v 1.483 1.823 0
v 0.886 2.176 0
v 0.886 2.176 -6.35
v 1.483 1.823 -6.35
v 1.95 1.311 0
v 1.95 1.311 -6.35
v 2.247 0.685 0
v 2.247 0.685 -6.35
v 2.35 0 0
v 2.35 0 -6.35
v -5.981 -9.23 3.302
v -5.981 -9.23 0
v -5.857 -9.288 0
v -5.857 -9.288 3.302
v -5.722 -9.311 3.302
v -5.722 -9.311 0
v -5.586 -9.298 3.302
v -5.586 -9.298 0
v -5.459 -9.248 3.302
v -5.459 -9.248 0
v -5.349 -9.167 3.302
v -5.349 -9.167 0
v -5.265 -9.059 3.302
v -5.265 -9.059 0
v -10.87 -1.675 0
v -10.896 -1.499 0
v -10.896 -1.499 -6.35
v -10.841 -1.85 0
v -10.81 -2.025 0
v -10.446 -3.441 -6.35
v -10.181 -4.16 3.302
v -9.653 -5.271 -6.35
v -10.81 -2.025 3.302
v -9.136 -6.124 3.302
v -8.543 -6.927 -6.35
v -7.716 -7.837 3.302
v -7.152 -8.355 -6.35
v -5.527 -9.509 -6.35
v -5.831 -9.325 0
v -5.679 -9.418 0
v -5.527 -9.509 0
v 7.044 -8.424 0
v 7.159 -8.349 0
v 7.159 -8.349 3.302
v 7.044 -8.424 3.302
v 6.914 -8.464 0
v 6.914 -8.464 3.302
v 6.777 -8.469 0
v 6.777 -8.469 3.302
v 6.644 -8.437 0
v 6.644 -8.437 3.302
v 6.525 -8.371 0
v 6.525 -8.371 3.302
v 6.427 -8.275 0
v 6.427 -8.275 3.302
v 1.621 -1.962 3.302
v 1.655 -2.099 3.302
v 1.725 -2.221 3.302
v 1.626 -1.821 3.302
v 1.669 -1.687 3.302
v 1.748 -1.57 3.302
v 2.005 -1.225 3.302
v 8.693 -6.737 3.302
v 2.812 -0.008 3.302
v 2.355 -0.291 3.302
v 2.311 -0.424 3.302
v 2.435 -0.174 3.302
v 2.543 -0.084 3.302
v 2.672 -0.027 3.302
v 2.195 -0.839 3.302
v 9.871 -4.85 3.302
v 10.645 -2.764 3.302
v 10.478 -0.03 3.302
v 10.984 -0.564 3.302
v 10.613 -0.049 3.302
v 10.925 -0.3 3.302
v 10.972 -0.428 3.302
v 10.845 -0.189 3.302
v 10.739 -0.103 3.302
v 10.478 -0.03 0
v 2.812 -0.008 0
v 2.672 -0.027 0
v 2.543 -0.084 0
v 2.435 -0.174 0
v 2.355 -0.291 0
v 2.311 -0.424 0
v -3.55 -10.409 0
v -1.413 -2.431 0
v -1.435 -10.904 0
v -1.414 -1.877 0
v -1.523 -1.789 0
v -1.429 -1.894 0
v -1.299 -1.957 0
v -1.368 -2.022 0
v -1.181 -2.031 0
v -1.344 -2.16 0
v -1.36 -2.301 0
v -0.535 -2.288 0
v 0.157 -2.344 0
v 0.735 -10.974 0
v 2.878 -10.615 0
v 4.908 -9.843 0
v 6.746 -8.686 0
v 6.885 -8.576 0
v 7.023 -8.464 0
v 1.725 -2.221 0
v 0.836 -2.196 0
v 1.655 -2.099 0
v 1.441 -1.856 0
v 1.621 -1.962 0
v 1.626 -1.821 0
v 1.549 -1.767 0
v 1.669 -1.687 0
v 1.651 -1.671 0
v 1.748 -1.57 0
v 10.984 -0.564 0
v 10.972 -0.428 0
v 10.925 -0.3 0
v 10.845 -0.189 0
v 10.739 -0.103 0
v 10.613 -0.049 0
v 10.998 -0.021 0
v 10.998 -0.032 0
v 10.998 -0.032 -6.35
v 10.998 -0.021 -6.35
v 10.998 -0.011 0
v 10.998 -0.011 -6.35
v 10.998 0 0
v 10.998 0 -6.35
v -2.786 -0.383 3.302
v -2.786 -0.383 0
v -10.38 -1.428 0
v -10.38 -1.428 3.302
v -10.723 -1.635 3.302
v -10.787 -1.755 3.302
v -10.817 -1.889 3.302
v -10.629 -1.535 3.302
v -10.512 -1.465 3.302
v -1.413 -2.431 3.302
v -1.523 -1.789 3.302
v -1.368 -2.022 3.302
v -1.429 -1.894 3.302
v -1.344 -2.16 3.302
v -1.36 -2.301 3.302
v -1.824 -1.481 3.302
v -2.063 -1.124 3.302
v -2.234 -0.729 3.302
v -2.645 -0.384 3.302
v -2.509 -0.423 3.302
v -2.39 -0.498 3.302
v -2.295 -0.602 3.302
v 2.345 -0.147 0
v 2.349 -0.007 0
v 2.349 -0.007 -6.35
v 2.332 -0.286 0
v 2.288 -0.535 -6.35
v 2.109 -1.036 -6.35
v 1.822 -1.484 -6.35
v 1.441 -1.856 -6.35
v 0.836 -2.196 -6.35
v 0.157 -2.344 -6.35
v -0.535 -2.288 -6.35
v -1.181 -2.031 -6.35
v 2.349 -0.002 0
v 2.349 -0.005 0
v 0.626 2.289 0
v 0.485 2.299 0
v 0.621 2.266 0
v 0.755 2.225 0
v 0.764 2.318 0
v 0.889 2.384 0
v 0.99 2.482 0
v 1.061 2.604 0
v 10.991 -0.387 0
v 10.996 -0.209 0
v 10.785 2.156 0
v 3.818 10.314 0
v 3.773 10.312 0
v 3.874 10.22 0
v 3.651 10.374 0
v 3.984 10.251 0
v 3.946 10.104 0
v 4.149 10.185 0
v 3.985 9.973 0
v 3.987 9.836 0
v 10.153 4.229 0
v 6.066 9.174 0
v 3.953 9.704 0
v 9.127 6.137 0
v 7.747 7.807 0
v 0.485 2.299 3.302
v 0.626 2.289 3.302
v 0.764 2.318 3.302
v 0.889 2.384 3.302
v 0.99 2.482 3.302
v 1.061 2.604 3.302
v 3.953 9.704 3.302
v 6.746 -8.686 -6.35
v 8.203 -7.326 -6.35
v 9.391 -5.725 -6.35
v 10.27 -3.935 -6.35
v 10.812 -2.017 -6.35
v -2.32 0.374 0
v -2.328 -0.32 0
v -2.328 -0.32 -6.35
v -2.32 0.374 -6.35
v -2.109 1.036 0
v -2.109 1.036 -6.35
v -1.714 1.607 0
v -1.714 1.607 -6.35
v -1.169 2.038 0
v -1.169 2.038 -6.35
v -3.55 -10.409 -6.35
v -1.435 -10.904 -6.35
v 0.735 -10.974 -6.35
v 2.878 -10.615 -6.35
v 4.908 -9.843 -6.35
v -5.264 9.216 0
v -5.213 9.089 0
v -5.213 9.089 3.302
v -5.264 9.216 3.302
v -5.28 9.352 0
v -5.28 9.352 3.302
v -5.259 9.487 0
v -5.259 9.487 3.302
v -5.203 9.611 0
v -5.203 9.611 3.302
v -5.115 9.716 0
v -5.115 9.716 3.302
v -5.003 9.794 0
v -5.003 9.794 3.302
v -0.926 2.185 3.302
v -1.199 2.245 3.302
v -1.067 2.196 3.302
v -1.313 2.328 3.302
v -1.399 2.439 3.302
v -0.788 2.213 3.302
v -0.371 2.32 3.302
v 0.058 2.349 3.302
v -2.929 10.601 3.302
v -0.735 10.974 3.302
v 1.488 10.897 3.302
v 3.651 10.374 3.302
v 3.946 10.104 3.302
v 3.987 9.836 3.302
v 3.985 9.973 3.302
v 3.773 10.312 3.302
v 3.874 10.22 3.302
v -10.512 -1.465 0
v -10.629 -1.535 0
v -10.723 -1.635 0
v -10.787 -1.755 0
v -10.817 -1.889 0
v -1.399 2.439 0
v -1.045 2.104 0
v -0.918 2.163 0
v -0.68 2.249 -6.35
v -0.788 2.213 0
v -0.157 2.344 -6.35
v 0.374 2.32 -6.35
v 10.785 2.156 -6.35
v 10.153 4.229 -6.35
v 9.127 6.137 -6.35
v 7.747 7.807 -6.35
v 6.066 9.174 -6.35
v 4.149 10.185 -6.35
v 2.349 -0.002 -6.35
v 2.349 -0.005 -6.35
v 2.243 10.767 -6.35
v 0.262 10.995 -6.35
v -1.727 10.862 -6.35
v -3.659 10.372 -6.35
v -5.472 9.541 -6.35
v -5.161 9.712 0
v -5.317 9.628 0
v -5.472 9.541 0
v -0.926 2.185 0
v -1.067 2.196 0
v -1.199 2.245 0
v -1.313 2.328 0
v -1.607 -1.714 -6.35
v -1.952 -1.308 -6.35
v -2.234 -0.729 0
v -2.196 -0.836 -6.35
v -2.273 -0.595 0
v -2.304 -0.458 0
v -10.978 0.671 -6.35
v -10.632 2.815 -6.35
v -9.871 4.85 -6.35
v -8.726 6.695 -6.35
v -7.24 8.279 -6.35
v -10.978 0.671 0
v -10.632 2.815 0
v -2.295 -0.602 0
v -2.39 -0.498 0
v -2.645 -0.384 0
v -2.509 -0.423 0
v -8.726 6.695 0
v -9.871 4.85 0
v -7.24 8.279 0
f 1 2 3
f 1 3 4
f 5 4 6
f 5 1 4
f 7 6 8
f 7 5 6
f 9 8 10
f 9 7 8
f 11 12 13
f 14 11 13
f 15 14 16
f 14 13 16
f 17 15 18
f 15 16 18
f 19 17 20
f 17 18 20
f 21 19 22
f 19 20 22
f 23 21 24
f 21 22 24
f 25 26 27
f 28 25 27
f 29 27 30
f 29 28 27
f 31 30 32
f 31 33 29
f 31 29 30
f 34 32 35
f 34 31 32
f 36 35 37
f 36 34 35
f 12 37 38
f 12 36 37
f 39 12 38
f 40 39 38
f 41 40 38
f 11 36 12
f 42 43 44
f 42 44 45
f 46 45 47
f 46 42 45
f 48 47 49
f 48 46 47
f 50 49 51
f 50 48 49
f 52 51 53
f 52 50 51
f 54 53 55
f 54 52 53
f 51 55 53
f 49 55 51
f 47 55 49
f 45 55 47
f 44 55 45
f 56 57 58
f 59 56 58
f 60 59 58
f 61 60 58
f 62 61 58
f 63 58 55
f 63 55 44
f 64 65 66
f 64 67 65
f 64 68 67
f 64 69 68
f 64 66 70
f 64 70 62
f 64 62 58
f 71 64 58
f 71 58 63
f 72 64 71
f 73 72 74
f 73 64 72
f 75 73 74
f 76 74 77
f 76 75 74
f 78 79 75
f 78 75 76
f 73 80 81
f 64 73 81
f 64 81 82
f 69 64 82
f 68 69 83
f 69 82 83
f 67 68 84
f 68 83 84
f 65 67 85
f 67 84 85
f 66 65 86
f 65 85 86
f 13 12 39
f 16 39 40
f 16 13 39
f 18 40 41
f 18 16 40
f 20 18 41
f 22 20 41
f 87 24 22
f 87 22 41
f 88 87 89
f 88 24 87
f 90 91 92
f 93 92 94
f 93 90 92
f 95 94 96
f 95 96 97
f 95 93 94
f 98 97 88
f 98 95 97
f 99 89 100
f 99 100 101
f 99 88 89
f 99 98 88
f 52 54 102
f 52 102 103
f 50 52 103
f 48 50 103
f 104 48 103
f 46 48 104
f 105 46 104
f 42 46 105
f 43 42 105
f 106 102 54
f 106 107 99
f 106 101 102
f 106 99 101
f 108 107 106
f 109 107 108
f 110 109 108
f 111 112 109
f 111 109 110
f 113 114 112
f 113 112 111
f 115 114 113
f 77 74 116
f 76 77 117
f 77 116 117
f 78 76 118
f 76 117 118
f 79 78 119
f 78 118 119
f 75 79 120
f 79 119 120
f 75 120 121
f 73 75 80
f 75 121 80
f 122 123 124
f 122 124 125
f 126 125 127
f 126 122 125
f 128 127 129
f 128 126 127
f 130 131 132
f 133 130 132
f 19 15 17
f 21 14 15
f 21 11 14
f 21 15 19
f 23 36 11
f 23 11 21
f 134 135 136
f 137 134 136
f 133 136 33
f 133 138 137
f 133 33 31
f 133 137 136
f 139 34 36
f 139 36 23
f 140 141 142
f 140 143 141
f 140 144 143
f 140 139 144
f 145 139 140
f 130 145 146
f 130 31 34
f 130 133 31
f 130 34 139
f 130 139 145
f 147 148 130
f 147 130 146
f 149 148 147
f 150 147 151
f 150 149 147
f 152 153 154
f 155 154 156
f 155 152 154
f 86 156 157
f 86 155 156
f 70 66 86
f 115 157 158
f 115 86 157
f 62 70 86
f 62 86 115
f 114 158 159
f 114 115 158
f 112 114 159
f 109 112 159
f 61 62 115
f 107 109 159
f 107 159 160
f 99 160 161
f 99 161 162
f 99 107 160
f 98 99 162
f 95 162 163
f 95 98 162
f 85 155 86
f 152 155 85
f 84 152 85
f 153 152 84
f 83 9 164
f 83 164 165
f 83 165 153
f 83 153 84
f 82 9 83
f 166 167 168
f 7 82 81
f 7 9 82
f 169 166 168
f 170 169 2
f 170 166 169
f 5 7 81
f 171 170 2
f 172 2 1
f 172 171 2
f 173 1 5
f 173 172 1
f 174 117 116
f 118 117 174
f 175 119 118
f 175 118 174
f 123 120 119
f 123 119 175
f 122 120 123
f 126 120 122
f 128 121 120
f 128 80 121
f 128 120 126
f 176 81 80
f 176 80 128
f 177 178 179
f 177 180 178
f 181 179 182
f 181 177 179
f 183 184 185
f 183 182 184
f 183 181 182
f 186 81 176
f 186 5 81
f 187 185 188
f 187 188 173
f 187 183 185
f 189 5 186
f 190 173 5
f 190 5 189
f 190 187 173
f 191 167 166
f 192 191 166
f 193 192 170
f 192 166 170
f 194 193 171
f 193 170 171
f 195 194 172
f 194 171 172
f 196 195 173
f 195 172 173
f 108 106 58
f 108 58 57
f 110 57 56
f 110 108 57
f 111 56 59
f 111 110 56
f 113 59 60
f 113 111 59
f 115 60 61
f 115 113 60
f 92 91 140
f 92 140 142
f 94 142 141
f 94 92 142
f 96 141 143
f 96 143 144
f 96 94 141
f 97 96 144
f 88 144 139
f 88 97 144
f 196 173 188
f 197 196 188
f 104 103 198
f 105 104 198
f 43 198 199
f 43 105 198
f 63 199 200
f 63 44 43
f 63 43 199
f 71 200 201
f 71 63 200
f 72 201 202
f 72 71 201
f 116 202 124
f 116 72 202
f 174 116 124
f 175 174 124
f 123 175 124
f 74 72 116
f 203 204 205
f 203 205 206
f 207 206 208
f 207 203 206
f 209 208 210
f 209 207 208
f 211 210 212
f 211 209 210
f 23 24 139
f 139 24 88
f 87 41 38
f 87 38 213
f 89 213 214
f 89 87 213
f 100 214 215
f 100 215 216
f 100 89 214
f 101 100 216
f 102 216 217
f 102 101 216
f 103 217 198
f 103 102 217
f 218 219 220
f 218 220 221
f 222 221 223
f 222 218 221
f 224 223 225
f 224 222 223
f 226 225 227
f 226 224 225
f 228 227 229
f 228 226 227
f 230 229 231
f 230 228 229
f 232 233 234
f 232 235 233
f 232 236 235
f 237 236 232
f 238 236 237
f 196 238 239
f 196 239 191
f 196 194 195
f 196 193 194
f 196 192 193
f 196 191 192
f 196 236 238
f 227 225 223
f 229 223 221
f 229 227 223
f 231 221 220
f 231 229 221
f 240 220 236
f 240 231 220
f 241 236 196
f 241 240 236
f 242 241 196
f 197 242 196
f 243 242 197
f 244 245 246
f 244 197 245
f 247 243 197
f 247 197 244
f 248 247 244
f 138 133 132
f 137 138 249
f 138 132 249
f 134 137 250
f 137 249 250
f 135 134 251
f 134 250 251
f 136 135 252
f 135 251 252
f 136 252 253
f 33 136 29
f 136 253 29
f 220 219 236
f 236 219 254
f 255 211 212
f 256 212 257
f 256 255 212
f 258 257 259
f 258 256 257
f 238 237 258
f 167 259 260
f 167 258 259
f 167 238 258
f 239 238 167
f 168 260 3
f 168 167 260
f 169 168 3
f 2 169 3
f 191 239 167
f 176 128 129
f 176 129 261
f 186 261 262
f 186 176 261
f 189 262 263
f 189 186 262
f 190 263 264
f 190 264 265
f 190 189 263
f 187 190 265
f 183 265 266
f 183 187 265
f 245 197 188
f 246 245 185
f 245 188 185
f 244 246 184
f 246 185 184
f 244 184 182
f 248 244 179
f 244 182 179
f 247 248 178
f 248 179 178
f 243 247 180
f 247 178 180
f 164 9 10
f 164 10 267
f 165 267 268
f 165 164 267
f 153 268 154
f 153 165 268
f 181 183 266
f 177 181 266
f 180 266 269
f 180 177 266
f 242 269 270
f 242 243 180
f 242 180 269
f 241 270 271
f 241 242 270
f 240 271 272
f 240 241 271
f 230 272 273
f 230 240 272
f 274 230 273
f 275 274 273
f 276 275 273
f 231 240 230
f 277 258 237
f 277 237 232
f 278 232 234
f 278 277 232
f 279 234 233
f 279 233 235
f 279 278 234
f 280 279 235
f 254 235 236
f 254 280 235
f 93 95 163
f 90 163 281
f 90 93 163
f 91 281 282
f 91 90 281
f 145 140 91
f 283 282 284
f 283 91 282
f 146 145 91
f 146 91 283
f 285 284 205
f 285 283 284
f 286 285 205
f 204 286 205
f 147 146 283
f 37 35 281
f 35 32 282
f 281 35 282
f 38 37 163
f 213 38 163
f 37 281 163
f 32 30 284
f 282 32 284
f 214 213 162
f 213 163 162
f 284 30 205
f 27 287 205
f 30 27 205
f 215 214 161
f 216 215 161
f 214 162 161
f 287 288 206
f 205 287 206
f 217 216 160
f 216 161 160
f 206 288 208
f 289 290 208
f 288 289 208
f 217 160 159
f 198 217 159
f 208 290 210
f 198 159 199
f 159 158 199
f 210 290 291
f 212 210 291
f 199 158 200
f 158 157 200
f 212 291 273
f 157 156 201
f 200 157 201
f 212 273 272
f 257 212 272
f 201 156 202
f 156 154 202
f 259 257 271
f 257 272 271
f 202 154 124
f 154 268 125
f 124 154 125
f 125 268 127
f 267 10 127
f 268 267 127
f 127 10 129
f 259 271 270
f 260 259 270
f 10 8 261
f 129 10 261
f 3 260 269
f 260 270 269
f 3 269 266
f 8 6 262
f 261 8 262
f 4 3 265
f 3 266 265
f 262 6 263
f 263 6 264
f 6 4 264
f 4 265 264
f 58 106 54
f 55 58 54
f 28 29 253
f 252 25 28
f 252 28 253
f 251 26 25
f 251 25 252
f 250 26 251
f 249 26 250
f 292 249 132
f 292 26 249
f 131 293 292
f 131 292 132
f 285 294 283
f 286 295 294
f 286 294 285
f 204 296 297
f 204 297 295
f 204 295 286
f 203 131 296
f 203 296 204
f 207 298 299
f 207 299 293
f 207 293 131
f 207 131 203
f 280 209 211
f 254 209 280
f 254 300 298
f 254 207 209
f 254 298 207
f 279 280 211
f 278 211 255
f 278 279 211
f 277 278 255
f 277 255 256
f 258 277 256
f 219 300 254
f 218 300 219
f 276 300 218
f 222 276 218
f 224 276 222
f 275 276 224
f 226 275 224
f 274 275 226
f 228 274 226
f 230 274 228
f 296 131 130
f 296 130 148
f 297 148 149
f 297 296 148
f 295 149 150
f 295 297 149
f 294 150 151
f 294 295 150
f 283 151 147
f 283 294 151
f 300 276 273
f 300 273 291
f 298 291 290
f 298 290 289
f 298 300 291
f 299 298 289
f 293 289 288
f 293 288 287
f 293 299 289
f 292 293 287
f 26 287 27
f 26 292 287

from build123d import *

# Parameters (mm, degrees)
F1_DEPTH    = 3.302
F2_DEPTH    = 6.35
F3_T1_DEPTH = 4.6338919233
F4_T1_DEPTH = 4.4582047696


# Not quite as in the source:
# - a fillet or chamfer that OpenCascade refuses, or shapes differently, is made with other operations: its cross-section is extruded or revolved along the edge and cut away or added


with BuildPart() as f1:
    # F0 (on Top) → F1 (new body)
    with BuildSketch(Plane.XY):
        with BuildLine():
            Line((0.8864303251, 2.1758656964), (4.1494522244, 10.1854037464))
            ThreePointArc((4.1494522244, 10.1854037464), (-0.7354841661, 10.9735803766), (-5.4715498037, 9.5405736717))
            Line((-5.4715498037, 9.5405736717), (-1.1688645655, 2.0381133132))
            ThreePointArc((-1.1688645655, 2.0381133132), (-0.157118442, 2.3442406116), (0.8864303251, 2.1758656964))
        make_face()
    extrude(amount=F1_DEPTH)



with BuildPart() as f1b:
    # F0 (on Top) → F1, piece 2 (new body)
    with BuildSketch(Plane.XY):
        with BuildLine():
            Line((-2.3275701308, -0.320261668), (-10.8955445044, -1.4991708351))
            ThreePointArc((-10.8955445044, -1.4991708351), (-9.1356572935, -6.1237381602), (-5.5266042645, -9.5087879639))
            Line((-5.5266042645, -9.5087879639), (-1.1806256223, -2.0313230639))
            ThreePointArc((-1.1806256223, -2.0313230639), (-1.9516127013, -1.3081888679), (-2.3275701308, -0.320261668))
        make_face()
    extrude(amount=F1_DEPTH)


with BuildPart() as f1c:
    # F0 (on Top) → F1, piece 3 (new body)
    with BuildSketch(Plane.XY):
        with BuildLine():
            ThreePointArc((6.74609228, -8.6862329113), (9.8711414597, -4.8498422164), (10.9981540682, -0.0317857078))
            Line((10.9981540682, -0.0317857078), (2.3494901878, -0.0067902494))
            ThreePointArc((2.3494901878, -0.0067902494), (2.1087311432, -1.0360517437), (1.4411398058, -1.8556040284))
            Line((1.4411398058, -1.8556040284), (6.74609228, -8.6862329113))
        make_face()
    extrude(amount=F1_DEPTH)


with BuildPart() as f1_1:
    add(f1.part)

    add(f1b.part)  # F2 merges F1b

    add(f1c.part)  # F2 merges F1c
    # F0 (on Top) → F2 (join)
    with BuildSketch(Plane.XY):
        with BuildLine():
            ThreePointArc((10.9981540682, -0.0317857078), (10.9981885171, -0.0158928705), (10.9982, 0))
            ThreePointArc((10.9982, 0), (9.1267986911, 6.136933183), (4.1494522244, 10.1854037464))
            Line((4.1494522244, 10.1854037464), (0.8864303251, 2.1758656964))
            ThreePointArc((0.8864303251, 2.1758656964), (1.9497202747, 1.3110076661), (2.3495, 0))
            ThreePointArc((2.3495, 0), (2.3494975469, -0.0033951282), (2.3494901878, -0.0067902494))
            Line((2.3494901878, -0.0067902494), (10.9981540682, -0.0317857078))
        make_face()
        with BuildLine():
            Line((0.8864303251, 2.1758656964), (4.1494522244, 10.1854037464))
            ThreePointArc((4.1494522244, 10.1854037464), (-0.7354841661, 10.9735803766), (-5.4715498037, 9.5405736717))
            Line((-5.4715498037, 9.5405736717), (-1.1688645655, 2.0381133132))
            ThreePointArc((-1.1688645655, 2.0381133132), (-0.157118442, 2.3442406116), (0.8864303251, 2.1758656964))
        make_face()
        with BuildLine():
            ThreePointArc((6.74609228, -8.6862329113), (9.8711414597, -4.8498422164), (10.9981540682, -0.0317857078))
            Line((10.9981540682, -0.0317857078), (2.3494901878, -0.0067902494))
            ThreePointArc((2.3494901878, -0.0067902494), (2.1087311432, -1.0360517437), (1.4411398058, -1.8556040284))
            Line((1.4411398058, -1.8556040284), (6.74609228, -8.6862329113))
        make_face()
        with BuildLine():
            Line((-1.1688645655, 2.0381133132), (-5.4715498037, 9.5405736717))
            ThreePointArc((-5.4715498037, 9.5405736717), (-9.8711414597, 4.8498422164), (-10.8955445044, -1.4991708351))
            Line((-10.8955445044, -1.4991708351), (-2.3275701308, -0.320261668))
            ThreePointArc((-2.3275701308, -0.320261668), (-2.1087311432, 1.0360517437), (-1.1688645655, 2.0381133132))
        make_face()
        with BuildLine():
            ThreePointArc((-5.5266042645, -9.5087879639), (0.7354841661, -10.9735803766), (6.74609228, -8.6862329113))
            Line((6.74609228, -8.6862329113), (1.4411398058, -1.8556040284))
            ThreePointArc((1.4411398058, -1.8556040284), (0.157118442, -2.3442406116), (-1.1806256223, -2.0313230639))
            Line((-1.1806256223, -2.0313230639), (-5.5266042645, -9.5087879639))
        make_face()
        with BuildLine():
            Line((-2.3275701308, -0.320261668), (-10.8955445044, -1.4991708351))
            ThreePointArc((-10.8955445044, -1.4991708351), (-9.1356572935, -6.1237381602), (-5.5266042645, -9.5087879639))
            Line((-5.5266042645, -9.5087879639), (-1.1806256223, -2.0313230639))
            ThreePointArc((-1.1806256223, -2.0313230639), (-1.9516127013, -1.3081888679), (-2.3275701308, -0.320261668))
        make_face()
    extrude(amount=-F2_DEPTH)

    # F3: fillet of radius 0.508 on 6 edges, made by hand

    # F3_s2 → F3_t1 (cut)
    with BuildSketch(Plane.XY):
        with BuildLine():
            ThreePointArc((3.9531481969, 9.7035483908), (3.9459668292, 10.1036299064), (3.6513440541, 10.3743958782))
            ThreePointArc((3.6513440541, 10.3743958782), (3.901542663, 10.2829163222), (4.1494522244, 10.1854037464))
            Line((4.1494522244, 10.1854037464), (3.9531481969, 9.7035483908))
        make_face()
        with BuildLine():
            ThreePointArc((10.9837113978, -0.5643466757), (10.8451967866, -0.1889395718), (10.4778487793, -0.0302819762))
            Line((10.4778487793, -0.0302819762), (10.9981540682, -0.0317857078))
            ThreePointArc((10.9981540682, -0.0317857078), (10.9941578867, -0.2981536556), (10.9837113978, -0.5643466757))
        make_face()
        with BuildLine():
            ThreePointArc((-5.212699429, 9.089224208), (-5.2589719244, 9.4866857122), (-5.0031171412, 9.7943464361))
            ThreePointArc((-5.0031171412, 9.7943464361), (-5.2388703034, 9.6702968509), (-5.4715498037, 9.5405736717))
            Line((-5.4715498037, 9.5405736717), (-5.212699429, 9.089224208))
        make_face()
        with BuildLine():
            ThreePointArc((7.1588183524, -8.3493546479), (6.7770167548, -8.4691224698), (6.4269453148, -8.2753009589))
            Line((6.4269453148, -8.2753009589), (6.74609228, -8.6862329113))
            ThreePointArc((6.74609228, -8.6862329113), (6.9544954285, -8.5202932212), (7.1588183524, -8.3493546479))
        make_face()
        with BuildLine():
            ThreePointArc((-5.9805942565, -9.2299997605), (-5.5862248623, -9.2977461404), (-5.2651493503, -9.0589422318))
            Line((-5.2651493503, -9.0589422318), (-5.5266042645, -9.5087879639))
            ThreePointArc((-5.5266042645, -9.5087879639), (-5.7552875833, -9.3721431953), (-5.9805942565, -9.2299997605))
        make_face()
        with BuildLine():
            ThreePointArc((-10.3800935118, -1.428247432), (-10.722983584, -1.6345074366), (-10.8101624065, -2.0250412303))
            ThreePointArc((-10.8101624065, -2.0250412303), (-10.8560380915, -1.762623101), (-10.8955445044, -1.4991708351))
            Line((-10.8955445044, -1.4991708351), (-10.3800935118, -1.428247432))
        make_face()
    extrude(amount=F3_T1_DEPTH, mode=Mode.SUBTRACT)

    # F4: fillet of radius 0.508 on 6 edges, made by hand

    # F4_s2 → F4_t1 (cut)
    with BuildSketch(Plane.XY):
        with BuildLine():
            ThreePointArc((-2.7857353042, -0.3833028373), (-2.4469491553, -0.4559663275), (-2.2335580647, -0.7289503561))
            ThreePointArc((-2.2335580647, -0.7289503561), (-2.2897006824, -0.5267077321), (-2.3275701308, -0.320261668))
            Line((-2.3275701308, -0.320261668), (-2.7857353042, -0.3833028373))
        make_face()
        with BuildLine():
            ThreePointArc((-1.5229431343, -1.7890764264), (-1.3515120564, -2.0901867434), (-1.4130231496, -2.4311741667))
            Line((-1.4130231496, -2.4311741667), (-1.1806256223, -2.0313230639))
            ThreePointArc((-1.1806256223, -2.0313230639), (-1.3572000088, -1.9178525455), (-1.5229431343, -1.7890764264))
        make_face()
        with BuildLine():
            ThreePointArc((-0.7879140674, 2.2134456561), (-1.1343987902, 2.215537146), (-1.3989470146, 2.439301027))
            Line((-1.3989470146, 2.439301027), (-1.1688645655, 2.0381133132))
            ThreePointArc((-1.1688645655, 2.0381133132), (-0.9823090207, 2.1342959584), (-0.7879140674, 2.2134456561))
        make_face()
        with BuildLine():
            ThreePointArc((0.4854895058, 2.2987932029), (0.8285961548, 2.3471032941), (1.0609176577, 2.6041689603))
            Line((1.0609176577, 2.6041689603), (0.8864303251, 2.1758656964))
            ThreePointArc((0.8864303251, 2.1758656964), (0.6887080648, 2.2462928241), (0.4854895058, 2.2987932029))
        make_face()
        with BuildLine():
            ThreePointArc((1.7248176465, -2.220866123), (1.6183530006, -1.8911369665), (1.7480685589, -1.5698428468))
            ThreePointArc((1.7480685589, -1.5698428468), (1.6009926176, -1.719585092), (1.4411398058, -1.8556040284))
            Line((1.4411398058, -1.8556040284), (1.7248176465, -2.220866123))
        make_face()
        with BuildLine():
            ThreePointArc((2.8119701642, -0.0081268603), (2.4859108466, -0.1253504027), (2.3108572018, -0.4243692296))
            ThreePointArc((2.3108572018, -0.4243692296), (2.3395090295, -0.2164434129), (2.3494901878, -0.0067902494))
            Line((2.3494901878, -0.0067902494), (2.8119701642, -0.0081268603))
        make_face()
    extrude(amount=F4_T1_DEPTH, mode=Mode.SUBTRACT)


solid = f1_1.part
